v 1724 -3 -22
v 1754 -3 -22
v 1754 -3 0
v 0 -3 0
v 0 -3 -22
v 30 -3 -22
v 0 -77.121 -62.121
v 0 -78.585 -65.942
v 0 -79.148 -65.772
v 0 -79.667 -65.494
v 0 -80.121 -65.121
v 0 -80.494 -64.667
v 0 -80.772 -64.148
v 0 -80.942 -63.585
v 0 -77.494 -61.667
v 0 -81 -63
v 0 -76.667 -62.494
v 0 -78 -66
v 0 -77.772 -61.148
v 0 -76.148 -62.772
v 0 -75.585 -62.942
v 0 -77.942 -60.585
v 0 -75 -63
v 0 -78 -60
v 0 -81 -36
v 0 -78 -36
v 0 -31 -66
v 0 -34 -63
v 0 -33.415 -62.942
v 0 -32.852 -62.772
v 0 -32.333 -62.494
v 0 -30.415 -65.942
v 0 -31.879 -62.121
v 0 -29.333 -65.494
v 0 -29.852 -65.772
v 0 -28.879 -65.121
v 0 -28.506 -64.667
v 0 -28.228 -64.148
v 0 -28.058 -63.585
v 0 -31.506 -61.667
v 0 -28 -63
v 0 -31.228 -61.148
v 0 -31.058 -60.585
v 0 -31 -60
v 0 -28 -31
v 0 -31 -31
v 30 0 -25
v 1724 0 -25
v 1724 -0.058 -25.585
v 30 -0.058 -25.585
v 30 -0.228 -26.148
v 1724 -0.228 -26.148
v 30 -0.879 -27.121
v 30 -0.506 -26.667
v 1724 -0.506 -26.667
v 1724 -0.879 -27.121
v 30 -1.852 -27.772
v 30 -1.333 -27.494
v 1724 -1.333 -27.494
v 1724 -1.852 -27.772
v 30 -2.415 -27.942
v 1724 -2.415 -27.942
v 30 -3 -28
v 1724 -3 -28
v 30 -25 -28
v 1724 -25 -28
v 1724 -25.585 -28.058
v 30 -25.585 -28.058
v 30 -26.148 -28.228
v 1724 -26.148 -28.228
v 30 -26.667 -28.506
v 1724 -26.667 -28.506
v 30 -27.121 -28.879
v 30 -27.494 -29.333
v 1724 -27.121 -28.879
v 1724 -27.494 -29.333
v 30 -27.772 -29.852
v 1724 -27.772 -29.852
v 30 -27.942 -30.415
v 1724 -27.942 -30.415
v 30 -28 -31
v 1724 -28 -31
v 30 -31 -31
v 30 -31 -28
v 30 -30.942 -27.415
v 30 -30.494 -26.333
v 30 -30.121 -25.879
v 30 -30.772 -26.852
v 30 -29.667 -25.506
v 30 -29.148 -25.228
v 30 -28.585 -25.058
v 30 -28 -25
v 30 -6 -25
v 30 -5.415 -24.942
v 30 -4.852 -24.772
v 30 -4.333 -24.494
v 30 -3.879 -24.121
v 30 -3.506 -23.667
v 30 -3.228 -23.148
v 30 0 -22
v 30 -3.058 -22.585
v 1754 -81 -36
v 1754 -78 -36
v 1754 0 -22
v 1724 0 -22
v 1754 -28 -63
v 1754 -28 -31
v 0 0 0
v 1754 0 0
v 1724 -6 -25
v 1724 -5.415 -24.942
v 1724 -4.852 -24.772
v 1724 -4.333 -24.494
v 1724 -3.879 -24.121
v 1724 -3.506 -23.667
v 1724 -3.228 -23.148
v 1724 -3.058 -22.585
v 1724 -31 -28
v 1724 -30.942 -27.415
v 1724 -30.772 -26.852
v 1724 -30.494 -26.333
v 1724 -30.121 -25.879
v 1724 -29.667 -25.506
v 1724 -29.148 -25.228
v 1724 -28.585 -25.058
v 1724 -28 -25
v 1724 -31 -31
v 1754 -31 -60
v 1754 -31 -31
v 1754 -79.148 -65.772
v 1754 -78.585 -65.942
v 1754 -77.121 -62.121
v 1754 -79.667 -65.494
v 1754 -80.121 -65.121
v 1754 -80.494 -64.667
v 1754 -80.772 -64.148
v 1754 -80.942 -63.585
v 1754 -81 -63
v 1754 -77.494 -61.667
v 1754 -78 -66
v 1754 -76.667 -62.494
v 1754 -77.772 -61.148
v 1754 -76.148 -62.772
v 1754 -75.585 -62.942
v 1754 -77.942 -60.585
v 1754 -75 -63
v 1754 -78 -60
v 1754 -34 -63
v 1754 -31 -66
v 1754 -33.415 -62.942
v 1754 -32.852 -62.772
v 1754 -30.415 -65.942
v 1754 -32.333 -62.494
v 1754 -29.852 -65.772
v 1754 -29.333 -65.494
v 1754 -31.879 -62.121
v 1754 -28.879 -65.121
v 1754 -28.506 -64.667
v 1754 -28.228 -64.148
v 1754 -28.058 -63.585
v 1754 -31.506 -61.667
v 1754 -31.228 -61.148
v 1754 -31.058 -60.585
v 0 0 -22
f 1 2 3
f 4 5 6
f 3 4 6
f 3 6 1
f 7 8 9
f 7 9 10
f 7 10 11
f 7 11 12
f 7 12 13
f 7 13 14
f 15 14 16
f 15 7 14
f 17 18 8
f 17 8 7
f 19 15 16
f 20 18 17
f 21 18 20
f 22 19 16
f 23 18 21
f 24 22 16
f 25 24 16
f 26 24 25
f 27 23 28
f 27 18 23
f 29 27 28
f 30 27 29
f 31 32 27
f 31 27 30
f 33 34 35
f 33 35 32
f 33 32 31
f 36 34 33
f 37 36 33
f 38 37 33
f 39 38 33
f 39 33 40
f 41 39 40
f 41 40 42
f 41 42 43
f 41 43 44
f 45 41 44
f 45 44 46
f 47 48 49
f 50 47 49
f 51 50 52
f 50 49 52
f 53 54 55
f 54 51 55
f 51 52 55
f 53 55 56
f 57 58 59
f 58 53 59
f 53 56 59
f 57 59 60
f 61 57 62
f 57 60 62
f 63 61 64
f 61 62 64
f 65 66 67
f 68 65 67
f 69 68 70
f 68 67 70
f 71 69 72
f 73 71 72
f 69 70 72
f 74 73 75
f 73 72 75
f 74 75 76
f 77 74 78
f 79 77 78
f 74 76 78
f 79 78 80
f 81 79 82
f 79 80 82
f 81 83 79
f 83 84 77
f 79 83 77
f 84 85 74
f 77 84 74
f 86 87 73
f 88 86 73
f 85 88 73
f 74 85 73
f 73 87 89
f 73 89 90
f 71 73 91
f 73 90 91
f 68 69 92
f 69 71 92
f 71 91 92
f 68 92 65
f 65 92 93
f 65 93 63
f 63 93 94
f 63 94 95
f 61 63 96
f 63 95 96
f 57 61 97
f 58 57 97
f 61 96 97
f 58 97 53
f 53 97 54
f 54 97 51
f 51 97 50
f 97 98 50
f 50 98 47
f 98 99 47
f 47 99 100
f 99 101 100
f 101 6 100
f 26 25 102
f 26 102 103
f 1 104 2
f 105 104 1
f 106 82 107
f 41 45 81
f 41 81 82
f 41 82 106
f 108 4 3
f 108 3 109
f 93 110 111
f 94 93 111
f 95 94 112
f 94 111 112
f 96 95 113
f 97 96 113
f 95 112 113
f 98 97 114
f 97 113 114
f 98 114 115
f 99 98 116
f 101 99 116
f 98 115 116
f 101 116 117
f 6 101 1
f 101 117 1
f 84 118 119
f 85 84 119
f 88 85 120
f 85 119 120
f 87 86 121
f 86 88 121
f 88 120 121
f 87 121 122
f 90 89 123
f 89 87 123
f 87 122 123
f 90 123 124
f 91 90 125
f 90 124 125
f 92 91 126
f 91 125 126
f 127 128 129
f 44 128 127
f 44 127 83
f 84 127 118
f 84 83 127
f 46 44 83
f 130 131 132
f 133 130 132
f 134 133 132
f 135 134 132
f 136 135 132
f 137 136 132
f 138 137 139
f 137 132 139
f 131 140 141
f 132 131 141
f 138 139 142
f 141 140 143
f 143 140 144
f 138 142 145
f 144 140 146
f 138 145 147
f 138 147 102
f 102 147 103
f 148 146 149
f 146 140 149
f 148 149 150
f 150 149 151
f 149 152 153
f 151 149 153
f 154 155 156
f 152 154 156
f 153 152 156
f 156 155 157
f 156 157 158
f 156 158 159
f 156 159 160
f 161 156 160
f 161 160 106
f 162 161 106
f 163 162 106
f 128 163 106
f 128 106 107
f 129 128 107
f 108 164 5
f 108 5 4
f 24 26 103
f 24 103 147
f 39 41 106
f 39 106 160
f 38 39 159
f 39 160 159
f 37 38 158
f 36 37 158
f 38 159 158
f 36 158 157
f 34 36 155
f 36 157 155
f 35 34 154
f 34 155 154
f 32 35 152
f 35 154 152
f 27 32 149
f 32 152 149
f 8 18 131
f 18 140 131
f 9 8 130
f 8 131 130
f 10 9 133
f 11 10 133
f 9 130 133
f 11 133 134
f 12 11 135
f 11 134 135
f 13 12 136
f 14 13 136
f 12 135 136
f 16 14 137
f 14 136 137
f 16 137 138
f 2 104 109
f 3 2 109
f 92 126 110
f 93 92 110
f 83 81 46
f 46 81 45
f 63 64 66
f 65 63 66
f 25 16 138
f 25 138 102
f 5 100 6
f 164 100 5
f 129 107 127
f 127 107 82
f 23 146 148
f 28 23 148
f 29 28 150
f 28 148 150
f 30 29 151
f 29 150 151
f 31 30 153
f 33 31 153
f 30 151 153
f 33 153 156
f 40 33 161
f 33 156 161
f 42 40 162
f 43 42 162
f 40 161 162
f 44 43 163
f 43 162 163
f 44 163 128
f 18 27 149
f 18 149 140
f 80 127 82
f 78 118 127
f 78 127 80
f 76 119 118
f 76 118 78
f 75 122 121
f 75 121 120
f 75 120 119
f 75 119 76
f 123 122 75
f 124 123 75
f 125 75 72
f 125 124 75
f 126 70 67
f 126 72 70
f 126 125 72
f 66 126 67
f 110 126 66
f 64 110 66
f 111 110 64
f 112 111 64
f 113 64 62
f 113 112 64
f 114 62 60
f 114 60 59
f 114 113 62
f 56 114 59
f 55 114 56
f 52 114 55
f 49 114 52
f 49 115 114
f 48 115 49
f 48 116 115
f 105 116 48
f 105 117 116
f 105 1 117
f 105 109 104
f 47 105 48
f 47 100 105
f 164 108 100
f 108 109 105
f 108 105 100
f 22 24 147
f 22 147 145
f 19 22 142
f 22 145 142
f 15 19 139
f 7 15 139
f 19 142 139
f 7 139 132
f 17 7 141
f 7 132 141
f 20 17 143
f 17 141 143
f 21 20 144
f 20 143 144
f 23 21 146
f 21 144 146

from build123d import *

# Parameters (mm, degrees)
BOSS_EXTRUDE1_DEPTH     = 1754
FILLET2_R               = 3
CUT_EXTRUDE4_DEPTH      = 3
CUT_EXTRUDE4_DEPTH_BACK = 6
SKETCH8_W               = 30
SKETCH8_H               = 31


with BuildPart() as part:
    # Sketch3 → Boss-Extrude1 (new body)
    with BuildSketch(Plane(origin=(0, 0, 0), x_dir=(0, 0, -1), z_dir=(1, 0, 0))):
        Polygon((0, 0), (28, 0), (28, -28), (66, -28), (66, -81), (36, -81), (36, -78), (63, -78), (63, -31), (25, -31), (25, -3), (0, -3), align=None)
    extrude(amount=BOSS_EXTRUDE1_DEPTH)

    # Fillet2
    fillet2_edges = [part.edges().sort_by_distance(p)[0] for p in [
        (877, 0, -28),
        (877, -28, -28),
        (877, -28, -66),
        (877, -81, -66),
        (877, -78, -63),
        (877, -31, -63),
        (877, -31, -25),
        (877, -3, -25),
    ]]
    fillet(fillet2_edges, radius=FILLET2_R)

    # Sketch8 → Cut-Extrude4 (cut, two sides: drawn at the far end of the back side and taken through both)
    with BuildSketch(Plane(origin=(0, 0, -28), x_dir=(-1, 0, 0), z_dir=(0, 0, -1)).offset(-CUT_EXTRUDE4_DEPTH_BACK)):
        with Locations((-15, -15.5)):
            Rectangle(SKETCH8_W, SKETCH8_H)
        with Locations((-1739, -15.5)):
            Rectangle(SKETCH8_W, SKETCH8_H)
    extrude(amount=CUT_EXTRUDE4_DEPTH + CUT_EXTRUDE4_DEPTH_BACK, mode=Mode.SUBTRACT)


solid = part.part
